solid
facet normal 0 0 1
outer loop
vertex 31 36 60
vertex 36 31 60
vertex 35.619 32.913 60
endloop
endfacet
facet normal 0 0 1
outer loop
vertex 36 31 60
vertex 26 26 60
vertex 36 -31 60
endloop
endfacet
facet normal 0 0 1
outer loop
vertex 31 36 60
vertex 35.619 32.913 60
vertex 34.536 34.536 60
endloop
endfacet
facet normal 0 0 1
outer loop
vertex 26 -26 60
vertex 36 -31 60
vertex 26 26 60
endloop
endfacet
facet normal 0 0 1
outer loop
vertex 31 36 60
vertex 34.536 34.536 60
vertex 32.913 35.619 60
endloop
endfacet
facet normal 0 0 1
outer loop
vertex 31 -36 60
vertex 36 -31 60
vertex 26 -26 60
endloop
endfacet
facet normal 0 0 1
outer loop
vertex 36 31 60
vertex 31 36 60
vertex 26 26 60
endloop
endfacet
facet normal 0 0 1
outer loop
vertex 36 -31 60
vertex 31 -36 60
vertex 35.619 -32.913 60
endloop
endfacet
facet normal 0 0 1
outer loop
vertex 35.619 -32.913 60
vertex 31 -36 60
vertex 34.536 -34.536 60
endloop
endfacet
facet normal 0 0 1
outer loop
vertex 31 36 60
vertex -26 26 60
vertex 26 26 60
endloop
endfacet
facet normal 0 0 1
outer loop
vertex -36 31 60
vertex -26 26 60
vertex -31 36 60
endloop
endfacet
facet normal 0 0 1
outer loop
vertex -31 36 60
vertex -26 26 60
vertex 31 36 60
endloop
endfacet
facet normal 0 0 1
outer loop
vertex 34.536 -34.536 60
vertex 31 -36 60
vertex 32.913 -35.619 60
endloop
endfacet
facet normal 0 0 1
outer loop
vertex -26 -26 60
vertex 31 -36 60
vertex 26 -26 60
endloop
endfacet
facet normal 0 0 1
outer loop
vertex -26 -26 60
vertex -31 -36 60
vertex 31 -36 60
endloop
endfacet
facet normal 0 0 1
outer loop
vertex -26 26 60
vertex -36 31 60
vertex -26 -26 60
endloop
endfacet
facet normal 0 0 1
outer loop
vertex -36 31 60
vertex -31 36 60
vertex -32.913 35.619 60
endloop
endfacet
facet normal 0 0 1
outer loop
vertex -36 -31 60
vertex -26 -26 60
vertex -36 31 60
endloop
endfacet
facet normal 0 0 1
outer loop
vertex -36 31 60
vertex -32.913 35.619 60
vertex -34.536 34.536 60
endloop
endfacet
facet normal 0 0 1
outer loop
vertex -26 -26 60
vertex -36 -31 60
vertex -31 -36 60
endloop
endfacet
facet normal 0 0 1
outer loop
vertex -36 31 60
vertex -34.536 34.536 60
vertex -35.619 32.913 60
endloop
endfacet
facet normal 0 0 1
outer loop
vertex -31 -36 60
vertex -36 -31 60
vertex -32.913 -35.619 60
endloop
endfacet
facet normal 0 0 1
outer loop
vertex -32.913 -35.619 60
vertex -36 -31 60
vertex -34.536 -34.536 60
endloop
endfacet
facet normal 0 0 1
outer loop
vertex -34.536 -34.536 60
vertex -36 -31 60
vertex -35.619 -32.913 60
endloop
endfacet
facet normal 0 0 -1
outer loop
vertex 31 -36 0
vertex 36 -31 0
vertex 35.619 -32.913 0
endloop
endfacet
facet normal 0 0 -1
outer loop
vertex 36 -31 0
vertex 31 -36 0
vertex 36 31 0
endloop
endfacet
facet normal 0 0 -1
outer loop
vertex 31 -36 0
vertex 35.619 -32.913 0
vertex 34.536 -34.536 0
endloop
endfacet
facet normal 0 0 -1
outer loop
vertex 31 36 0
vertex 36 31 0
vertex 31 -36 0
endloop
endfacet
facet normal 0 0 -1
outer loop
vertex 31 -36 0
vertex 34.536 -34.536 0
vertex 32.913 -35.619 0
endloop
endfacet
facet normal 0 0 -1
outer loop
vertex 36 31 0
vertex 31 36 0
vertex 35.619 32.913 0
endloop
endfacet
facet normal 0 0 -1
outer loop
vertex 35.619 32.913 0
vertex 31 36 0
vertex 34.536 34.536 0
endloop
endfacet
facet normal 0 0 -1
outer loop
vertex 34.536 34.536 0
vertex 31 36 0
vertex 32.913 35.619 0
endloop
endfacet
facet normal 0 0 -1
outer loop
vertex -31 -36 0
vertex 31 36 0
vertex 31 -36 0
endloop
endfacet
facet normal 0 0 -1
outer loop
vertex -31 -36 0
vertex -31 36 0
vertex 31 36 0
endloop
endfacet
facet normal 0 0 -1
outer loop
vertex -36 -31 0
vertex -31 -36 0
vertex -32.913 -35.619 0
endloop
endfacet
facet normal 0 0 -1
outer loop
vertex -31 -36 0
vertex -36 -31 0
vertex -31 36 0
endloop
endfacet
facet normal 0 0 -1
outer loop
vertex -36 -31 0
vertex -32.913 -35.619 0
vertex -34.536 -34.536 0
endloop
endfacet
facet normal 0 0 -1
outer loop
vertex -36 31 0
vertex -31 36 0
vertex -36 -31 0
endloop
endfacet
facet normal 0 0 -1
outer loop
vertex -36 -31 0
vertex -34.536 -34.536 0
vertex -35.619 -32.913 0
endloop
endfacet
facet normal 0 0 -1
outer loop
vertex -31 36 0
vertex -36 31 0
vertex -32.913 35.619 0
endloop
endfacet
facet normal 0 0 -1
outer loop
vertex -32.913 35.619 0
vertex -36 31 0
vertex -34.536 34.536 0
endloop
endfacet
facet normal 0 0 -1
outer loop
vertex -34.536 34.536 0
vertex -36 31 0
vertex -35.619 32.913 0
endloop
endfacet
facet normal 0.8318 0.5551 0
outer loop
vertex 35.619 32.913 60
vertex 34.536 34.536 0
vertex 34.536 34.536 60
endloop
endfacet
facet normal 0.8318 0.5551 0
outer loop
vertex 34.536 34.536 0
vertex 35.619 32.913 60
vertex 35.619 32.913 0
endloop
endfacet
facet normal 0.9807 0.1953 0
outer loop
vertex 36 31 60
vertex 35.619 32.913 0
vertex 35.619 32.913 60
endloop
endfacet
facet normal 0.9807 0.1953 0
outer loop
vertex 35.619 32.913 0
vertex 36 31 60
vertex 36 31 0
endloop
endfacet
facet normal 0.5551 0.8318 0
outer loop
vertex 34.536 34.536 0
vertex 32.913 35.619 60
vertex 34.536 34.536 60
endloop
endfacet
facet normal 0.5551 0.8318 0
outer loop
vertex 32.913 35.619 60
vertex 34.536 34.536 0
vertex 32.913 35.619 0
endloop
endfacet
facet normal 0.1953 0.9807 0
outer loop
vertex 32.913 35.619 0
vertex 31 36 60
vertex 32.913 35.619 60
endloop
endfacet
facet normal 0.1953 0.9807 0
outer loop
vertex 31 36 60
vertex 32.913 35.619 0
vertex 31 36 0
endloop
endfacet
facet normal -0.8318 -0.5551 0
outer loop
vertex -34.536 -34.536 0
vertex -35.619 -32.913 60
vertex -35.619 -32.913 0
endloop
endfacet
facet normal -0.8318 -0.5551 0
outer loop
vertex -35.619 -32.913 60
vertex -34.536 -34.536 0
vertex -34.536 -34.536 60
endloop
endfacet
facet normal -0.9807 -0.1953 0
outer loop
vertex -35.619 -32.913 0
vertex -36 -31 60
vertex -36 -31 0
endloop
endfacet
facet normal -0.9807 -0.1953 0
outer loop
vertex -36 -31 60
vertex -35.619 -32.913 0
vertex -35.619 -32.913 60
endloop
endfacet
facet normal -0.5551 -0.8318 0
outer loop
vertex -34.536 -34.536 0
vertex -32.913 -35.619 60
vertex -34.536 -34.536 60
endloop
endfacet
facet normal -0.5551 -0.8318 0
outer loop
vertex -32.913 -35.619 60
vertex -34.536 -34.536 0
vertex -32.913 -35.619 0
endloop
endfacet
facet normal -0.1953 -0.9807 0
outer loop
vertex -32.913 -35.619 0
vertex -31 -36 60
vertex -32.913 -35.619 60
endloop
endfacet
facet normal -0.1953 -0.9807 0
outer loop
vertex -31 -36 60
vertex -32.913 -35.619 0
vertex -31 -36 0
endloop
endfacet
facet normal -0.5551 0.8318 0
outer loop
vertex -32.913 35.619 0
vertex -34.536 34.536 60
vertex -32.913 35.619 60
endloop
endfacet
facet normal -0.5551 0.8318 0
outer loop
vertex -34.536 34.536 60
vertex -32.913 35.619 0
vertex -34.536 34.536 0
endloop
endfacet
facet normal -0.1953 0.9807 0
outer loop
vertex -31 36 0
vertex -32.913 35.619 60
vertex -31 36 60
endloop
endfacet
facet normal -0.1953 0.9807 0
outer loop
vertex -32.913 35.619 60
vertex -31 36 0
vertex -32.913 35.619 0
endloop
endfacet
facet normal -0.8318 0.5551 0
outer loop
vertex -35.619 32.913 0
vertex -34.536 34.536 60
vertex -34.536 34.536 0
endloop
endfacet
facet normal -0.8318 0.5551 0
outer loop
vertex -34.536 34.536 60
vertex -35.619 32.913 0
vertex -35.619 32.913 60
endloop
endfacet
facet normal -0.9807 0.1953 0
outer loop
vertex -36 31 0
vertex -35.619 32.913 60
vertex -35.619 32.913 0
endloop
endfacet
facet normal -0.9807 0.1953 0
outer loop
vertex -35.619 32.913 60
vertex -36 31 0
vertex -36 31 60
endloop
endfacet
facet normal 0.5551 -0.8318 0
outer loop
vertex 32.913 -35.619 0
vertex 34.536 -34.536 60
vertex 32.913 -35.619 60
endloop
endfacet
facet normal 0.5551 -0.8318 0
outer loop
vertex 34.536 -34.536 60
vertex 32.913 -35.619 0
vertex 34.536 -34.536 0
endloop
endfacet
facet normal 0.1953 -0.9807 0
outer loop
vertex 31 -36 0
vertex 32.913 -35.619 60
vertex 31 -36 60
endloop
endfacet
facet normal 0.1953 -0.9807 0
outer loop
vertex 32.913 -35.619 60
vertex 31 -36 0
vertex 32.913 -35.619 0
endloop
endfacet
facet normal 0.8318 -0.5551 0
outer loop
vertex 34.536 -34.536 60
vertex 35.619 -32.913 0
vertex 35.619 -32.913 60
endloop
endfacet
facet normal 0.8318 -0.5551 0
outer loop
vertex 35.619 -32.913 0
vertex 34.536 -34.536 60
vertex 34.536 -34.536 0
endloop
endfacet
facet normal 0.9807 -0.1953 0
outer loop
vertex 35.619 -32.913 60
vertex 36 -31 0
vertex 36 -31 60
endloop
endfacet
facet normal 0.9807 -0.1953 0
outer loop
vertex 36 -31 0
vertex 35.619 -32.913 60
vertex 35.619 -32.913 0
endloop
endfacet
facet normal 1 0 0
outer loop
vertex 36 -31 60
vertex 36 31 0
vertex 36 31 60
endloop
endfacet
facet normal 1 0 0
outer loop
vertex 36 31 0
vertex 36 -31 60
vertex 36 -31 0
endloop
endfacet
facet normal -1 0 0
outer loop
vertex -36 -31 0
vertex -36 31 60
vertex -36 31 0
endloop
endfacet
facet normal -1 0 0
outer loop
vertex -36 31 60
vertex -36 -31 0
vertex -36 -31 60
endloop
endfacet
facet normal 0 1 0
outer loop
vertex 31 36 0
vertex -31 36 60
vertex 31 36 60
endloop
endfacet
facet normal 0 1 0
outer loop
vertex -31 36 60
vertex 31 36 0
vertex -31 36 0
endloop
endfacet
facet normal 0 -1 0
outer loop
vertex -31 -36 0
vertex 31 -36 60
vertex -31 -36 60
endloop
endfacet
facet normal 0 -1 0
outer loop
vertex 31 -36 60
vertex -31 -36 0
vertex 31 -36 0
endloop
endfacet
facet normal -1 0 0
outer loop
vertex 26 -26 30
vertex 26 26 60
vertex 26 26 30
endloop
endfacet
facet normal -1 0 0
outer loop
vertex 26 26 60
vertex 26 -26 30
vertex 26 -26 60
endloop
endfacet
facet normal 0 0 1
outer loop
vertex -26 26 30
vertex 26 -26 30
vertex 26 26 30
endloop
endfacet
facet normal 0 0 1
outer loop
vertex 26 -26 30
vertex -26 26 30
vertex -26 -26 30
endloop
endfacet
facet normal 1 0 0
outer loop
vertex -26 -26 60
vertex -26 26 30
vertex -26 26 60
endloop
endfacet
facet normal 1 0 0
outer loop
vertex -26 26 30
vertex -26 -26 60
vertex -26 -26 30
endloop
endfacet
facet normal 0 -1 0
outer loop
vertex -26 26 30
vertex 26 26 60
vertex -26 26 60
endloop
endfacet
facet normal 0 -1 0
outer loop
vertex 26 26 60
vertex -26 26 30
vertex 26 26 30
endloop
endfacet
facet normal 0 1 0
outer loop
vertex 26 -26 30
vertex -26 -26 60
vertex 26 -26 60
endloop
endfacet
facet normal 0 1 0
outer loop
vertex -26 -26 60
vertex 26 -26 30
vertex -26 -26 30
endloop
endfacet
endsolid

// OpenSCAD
difference() {
    translate ([-36, -36, 0]) {
        cube([72,72,60]);
    }
    translate ([-26, -26, 30]) {
        cube([52,52,30]);
    }
    
    translate([31, 31, 0]) {
        difference() {
            cube([6, 6, 60]);
            cylinder(r=5, h=60);
        }
    }

    translate ([-31, -31, 0]) {
        rotate([0, 0, 180]) {
            difference() {
                cube([6, 6, 60]);
                cylinder(r=5, h=60);
            }
        }
    }
    
    translate ([-31, 31, 0]) {
        rotate([0, 0, 90]) {
            difference() {
                cube([6, 6, 60]);
                cylinder(r=5, h=60);
            }
        }
    }
    
    translate ([31, -31, 0]) {
        rotate([0, 0, -90]) {
            difference() {
                cube([6, 6, 60]);
                cylinder(r=5, h=60);
            }
        }
    }
}
